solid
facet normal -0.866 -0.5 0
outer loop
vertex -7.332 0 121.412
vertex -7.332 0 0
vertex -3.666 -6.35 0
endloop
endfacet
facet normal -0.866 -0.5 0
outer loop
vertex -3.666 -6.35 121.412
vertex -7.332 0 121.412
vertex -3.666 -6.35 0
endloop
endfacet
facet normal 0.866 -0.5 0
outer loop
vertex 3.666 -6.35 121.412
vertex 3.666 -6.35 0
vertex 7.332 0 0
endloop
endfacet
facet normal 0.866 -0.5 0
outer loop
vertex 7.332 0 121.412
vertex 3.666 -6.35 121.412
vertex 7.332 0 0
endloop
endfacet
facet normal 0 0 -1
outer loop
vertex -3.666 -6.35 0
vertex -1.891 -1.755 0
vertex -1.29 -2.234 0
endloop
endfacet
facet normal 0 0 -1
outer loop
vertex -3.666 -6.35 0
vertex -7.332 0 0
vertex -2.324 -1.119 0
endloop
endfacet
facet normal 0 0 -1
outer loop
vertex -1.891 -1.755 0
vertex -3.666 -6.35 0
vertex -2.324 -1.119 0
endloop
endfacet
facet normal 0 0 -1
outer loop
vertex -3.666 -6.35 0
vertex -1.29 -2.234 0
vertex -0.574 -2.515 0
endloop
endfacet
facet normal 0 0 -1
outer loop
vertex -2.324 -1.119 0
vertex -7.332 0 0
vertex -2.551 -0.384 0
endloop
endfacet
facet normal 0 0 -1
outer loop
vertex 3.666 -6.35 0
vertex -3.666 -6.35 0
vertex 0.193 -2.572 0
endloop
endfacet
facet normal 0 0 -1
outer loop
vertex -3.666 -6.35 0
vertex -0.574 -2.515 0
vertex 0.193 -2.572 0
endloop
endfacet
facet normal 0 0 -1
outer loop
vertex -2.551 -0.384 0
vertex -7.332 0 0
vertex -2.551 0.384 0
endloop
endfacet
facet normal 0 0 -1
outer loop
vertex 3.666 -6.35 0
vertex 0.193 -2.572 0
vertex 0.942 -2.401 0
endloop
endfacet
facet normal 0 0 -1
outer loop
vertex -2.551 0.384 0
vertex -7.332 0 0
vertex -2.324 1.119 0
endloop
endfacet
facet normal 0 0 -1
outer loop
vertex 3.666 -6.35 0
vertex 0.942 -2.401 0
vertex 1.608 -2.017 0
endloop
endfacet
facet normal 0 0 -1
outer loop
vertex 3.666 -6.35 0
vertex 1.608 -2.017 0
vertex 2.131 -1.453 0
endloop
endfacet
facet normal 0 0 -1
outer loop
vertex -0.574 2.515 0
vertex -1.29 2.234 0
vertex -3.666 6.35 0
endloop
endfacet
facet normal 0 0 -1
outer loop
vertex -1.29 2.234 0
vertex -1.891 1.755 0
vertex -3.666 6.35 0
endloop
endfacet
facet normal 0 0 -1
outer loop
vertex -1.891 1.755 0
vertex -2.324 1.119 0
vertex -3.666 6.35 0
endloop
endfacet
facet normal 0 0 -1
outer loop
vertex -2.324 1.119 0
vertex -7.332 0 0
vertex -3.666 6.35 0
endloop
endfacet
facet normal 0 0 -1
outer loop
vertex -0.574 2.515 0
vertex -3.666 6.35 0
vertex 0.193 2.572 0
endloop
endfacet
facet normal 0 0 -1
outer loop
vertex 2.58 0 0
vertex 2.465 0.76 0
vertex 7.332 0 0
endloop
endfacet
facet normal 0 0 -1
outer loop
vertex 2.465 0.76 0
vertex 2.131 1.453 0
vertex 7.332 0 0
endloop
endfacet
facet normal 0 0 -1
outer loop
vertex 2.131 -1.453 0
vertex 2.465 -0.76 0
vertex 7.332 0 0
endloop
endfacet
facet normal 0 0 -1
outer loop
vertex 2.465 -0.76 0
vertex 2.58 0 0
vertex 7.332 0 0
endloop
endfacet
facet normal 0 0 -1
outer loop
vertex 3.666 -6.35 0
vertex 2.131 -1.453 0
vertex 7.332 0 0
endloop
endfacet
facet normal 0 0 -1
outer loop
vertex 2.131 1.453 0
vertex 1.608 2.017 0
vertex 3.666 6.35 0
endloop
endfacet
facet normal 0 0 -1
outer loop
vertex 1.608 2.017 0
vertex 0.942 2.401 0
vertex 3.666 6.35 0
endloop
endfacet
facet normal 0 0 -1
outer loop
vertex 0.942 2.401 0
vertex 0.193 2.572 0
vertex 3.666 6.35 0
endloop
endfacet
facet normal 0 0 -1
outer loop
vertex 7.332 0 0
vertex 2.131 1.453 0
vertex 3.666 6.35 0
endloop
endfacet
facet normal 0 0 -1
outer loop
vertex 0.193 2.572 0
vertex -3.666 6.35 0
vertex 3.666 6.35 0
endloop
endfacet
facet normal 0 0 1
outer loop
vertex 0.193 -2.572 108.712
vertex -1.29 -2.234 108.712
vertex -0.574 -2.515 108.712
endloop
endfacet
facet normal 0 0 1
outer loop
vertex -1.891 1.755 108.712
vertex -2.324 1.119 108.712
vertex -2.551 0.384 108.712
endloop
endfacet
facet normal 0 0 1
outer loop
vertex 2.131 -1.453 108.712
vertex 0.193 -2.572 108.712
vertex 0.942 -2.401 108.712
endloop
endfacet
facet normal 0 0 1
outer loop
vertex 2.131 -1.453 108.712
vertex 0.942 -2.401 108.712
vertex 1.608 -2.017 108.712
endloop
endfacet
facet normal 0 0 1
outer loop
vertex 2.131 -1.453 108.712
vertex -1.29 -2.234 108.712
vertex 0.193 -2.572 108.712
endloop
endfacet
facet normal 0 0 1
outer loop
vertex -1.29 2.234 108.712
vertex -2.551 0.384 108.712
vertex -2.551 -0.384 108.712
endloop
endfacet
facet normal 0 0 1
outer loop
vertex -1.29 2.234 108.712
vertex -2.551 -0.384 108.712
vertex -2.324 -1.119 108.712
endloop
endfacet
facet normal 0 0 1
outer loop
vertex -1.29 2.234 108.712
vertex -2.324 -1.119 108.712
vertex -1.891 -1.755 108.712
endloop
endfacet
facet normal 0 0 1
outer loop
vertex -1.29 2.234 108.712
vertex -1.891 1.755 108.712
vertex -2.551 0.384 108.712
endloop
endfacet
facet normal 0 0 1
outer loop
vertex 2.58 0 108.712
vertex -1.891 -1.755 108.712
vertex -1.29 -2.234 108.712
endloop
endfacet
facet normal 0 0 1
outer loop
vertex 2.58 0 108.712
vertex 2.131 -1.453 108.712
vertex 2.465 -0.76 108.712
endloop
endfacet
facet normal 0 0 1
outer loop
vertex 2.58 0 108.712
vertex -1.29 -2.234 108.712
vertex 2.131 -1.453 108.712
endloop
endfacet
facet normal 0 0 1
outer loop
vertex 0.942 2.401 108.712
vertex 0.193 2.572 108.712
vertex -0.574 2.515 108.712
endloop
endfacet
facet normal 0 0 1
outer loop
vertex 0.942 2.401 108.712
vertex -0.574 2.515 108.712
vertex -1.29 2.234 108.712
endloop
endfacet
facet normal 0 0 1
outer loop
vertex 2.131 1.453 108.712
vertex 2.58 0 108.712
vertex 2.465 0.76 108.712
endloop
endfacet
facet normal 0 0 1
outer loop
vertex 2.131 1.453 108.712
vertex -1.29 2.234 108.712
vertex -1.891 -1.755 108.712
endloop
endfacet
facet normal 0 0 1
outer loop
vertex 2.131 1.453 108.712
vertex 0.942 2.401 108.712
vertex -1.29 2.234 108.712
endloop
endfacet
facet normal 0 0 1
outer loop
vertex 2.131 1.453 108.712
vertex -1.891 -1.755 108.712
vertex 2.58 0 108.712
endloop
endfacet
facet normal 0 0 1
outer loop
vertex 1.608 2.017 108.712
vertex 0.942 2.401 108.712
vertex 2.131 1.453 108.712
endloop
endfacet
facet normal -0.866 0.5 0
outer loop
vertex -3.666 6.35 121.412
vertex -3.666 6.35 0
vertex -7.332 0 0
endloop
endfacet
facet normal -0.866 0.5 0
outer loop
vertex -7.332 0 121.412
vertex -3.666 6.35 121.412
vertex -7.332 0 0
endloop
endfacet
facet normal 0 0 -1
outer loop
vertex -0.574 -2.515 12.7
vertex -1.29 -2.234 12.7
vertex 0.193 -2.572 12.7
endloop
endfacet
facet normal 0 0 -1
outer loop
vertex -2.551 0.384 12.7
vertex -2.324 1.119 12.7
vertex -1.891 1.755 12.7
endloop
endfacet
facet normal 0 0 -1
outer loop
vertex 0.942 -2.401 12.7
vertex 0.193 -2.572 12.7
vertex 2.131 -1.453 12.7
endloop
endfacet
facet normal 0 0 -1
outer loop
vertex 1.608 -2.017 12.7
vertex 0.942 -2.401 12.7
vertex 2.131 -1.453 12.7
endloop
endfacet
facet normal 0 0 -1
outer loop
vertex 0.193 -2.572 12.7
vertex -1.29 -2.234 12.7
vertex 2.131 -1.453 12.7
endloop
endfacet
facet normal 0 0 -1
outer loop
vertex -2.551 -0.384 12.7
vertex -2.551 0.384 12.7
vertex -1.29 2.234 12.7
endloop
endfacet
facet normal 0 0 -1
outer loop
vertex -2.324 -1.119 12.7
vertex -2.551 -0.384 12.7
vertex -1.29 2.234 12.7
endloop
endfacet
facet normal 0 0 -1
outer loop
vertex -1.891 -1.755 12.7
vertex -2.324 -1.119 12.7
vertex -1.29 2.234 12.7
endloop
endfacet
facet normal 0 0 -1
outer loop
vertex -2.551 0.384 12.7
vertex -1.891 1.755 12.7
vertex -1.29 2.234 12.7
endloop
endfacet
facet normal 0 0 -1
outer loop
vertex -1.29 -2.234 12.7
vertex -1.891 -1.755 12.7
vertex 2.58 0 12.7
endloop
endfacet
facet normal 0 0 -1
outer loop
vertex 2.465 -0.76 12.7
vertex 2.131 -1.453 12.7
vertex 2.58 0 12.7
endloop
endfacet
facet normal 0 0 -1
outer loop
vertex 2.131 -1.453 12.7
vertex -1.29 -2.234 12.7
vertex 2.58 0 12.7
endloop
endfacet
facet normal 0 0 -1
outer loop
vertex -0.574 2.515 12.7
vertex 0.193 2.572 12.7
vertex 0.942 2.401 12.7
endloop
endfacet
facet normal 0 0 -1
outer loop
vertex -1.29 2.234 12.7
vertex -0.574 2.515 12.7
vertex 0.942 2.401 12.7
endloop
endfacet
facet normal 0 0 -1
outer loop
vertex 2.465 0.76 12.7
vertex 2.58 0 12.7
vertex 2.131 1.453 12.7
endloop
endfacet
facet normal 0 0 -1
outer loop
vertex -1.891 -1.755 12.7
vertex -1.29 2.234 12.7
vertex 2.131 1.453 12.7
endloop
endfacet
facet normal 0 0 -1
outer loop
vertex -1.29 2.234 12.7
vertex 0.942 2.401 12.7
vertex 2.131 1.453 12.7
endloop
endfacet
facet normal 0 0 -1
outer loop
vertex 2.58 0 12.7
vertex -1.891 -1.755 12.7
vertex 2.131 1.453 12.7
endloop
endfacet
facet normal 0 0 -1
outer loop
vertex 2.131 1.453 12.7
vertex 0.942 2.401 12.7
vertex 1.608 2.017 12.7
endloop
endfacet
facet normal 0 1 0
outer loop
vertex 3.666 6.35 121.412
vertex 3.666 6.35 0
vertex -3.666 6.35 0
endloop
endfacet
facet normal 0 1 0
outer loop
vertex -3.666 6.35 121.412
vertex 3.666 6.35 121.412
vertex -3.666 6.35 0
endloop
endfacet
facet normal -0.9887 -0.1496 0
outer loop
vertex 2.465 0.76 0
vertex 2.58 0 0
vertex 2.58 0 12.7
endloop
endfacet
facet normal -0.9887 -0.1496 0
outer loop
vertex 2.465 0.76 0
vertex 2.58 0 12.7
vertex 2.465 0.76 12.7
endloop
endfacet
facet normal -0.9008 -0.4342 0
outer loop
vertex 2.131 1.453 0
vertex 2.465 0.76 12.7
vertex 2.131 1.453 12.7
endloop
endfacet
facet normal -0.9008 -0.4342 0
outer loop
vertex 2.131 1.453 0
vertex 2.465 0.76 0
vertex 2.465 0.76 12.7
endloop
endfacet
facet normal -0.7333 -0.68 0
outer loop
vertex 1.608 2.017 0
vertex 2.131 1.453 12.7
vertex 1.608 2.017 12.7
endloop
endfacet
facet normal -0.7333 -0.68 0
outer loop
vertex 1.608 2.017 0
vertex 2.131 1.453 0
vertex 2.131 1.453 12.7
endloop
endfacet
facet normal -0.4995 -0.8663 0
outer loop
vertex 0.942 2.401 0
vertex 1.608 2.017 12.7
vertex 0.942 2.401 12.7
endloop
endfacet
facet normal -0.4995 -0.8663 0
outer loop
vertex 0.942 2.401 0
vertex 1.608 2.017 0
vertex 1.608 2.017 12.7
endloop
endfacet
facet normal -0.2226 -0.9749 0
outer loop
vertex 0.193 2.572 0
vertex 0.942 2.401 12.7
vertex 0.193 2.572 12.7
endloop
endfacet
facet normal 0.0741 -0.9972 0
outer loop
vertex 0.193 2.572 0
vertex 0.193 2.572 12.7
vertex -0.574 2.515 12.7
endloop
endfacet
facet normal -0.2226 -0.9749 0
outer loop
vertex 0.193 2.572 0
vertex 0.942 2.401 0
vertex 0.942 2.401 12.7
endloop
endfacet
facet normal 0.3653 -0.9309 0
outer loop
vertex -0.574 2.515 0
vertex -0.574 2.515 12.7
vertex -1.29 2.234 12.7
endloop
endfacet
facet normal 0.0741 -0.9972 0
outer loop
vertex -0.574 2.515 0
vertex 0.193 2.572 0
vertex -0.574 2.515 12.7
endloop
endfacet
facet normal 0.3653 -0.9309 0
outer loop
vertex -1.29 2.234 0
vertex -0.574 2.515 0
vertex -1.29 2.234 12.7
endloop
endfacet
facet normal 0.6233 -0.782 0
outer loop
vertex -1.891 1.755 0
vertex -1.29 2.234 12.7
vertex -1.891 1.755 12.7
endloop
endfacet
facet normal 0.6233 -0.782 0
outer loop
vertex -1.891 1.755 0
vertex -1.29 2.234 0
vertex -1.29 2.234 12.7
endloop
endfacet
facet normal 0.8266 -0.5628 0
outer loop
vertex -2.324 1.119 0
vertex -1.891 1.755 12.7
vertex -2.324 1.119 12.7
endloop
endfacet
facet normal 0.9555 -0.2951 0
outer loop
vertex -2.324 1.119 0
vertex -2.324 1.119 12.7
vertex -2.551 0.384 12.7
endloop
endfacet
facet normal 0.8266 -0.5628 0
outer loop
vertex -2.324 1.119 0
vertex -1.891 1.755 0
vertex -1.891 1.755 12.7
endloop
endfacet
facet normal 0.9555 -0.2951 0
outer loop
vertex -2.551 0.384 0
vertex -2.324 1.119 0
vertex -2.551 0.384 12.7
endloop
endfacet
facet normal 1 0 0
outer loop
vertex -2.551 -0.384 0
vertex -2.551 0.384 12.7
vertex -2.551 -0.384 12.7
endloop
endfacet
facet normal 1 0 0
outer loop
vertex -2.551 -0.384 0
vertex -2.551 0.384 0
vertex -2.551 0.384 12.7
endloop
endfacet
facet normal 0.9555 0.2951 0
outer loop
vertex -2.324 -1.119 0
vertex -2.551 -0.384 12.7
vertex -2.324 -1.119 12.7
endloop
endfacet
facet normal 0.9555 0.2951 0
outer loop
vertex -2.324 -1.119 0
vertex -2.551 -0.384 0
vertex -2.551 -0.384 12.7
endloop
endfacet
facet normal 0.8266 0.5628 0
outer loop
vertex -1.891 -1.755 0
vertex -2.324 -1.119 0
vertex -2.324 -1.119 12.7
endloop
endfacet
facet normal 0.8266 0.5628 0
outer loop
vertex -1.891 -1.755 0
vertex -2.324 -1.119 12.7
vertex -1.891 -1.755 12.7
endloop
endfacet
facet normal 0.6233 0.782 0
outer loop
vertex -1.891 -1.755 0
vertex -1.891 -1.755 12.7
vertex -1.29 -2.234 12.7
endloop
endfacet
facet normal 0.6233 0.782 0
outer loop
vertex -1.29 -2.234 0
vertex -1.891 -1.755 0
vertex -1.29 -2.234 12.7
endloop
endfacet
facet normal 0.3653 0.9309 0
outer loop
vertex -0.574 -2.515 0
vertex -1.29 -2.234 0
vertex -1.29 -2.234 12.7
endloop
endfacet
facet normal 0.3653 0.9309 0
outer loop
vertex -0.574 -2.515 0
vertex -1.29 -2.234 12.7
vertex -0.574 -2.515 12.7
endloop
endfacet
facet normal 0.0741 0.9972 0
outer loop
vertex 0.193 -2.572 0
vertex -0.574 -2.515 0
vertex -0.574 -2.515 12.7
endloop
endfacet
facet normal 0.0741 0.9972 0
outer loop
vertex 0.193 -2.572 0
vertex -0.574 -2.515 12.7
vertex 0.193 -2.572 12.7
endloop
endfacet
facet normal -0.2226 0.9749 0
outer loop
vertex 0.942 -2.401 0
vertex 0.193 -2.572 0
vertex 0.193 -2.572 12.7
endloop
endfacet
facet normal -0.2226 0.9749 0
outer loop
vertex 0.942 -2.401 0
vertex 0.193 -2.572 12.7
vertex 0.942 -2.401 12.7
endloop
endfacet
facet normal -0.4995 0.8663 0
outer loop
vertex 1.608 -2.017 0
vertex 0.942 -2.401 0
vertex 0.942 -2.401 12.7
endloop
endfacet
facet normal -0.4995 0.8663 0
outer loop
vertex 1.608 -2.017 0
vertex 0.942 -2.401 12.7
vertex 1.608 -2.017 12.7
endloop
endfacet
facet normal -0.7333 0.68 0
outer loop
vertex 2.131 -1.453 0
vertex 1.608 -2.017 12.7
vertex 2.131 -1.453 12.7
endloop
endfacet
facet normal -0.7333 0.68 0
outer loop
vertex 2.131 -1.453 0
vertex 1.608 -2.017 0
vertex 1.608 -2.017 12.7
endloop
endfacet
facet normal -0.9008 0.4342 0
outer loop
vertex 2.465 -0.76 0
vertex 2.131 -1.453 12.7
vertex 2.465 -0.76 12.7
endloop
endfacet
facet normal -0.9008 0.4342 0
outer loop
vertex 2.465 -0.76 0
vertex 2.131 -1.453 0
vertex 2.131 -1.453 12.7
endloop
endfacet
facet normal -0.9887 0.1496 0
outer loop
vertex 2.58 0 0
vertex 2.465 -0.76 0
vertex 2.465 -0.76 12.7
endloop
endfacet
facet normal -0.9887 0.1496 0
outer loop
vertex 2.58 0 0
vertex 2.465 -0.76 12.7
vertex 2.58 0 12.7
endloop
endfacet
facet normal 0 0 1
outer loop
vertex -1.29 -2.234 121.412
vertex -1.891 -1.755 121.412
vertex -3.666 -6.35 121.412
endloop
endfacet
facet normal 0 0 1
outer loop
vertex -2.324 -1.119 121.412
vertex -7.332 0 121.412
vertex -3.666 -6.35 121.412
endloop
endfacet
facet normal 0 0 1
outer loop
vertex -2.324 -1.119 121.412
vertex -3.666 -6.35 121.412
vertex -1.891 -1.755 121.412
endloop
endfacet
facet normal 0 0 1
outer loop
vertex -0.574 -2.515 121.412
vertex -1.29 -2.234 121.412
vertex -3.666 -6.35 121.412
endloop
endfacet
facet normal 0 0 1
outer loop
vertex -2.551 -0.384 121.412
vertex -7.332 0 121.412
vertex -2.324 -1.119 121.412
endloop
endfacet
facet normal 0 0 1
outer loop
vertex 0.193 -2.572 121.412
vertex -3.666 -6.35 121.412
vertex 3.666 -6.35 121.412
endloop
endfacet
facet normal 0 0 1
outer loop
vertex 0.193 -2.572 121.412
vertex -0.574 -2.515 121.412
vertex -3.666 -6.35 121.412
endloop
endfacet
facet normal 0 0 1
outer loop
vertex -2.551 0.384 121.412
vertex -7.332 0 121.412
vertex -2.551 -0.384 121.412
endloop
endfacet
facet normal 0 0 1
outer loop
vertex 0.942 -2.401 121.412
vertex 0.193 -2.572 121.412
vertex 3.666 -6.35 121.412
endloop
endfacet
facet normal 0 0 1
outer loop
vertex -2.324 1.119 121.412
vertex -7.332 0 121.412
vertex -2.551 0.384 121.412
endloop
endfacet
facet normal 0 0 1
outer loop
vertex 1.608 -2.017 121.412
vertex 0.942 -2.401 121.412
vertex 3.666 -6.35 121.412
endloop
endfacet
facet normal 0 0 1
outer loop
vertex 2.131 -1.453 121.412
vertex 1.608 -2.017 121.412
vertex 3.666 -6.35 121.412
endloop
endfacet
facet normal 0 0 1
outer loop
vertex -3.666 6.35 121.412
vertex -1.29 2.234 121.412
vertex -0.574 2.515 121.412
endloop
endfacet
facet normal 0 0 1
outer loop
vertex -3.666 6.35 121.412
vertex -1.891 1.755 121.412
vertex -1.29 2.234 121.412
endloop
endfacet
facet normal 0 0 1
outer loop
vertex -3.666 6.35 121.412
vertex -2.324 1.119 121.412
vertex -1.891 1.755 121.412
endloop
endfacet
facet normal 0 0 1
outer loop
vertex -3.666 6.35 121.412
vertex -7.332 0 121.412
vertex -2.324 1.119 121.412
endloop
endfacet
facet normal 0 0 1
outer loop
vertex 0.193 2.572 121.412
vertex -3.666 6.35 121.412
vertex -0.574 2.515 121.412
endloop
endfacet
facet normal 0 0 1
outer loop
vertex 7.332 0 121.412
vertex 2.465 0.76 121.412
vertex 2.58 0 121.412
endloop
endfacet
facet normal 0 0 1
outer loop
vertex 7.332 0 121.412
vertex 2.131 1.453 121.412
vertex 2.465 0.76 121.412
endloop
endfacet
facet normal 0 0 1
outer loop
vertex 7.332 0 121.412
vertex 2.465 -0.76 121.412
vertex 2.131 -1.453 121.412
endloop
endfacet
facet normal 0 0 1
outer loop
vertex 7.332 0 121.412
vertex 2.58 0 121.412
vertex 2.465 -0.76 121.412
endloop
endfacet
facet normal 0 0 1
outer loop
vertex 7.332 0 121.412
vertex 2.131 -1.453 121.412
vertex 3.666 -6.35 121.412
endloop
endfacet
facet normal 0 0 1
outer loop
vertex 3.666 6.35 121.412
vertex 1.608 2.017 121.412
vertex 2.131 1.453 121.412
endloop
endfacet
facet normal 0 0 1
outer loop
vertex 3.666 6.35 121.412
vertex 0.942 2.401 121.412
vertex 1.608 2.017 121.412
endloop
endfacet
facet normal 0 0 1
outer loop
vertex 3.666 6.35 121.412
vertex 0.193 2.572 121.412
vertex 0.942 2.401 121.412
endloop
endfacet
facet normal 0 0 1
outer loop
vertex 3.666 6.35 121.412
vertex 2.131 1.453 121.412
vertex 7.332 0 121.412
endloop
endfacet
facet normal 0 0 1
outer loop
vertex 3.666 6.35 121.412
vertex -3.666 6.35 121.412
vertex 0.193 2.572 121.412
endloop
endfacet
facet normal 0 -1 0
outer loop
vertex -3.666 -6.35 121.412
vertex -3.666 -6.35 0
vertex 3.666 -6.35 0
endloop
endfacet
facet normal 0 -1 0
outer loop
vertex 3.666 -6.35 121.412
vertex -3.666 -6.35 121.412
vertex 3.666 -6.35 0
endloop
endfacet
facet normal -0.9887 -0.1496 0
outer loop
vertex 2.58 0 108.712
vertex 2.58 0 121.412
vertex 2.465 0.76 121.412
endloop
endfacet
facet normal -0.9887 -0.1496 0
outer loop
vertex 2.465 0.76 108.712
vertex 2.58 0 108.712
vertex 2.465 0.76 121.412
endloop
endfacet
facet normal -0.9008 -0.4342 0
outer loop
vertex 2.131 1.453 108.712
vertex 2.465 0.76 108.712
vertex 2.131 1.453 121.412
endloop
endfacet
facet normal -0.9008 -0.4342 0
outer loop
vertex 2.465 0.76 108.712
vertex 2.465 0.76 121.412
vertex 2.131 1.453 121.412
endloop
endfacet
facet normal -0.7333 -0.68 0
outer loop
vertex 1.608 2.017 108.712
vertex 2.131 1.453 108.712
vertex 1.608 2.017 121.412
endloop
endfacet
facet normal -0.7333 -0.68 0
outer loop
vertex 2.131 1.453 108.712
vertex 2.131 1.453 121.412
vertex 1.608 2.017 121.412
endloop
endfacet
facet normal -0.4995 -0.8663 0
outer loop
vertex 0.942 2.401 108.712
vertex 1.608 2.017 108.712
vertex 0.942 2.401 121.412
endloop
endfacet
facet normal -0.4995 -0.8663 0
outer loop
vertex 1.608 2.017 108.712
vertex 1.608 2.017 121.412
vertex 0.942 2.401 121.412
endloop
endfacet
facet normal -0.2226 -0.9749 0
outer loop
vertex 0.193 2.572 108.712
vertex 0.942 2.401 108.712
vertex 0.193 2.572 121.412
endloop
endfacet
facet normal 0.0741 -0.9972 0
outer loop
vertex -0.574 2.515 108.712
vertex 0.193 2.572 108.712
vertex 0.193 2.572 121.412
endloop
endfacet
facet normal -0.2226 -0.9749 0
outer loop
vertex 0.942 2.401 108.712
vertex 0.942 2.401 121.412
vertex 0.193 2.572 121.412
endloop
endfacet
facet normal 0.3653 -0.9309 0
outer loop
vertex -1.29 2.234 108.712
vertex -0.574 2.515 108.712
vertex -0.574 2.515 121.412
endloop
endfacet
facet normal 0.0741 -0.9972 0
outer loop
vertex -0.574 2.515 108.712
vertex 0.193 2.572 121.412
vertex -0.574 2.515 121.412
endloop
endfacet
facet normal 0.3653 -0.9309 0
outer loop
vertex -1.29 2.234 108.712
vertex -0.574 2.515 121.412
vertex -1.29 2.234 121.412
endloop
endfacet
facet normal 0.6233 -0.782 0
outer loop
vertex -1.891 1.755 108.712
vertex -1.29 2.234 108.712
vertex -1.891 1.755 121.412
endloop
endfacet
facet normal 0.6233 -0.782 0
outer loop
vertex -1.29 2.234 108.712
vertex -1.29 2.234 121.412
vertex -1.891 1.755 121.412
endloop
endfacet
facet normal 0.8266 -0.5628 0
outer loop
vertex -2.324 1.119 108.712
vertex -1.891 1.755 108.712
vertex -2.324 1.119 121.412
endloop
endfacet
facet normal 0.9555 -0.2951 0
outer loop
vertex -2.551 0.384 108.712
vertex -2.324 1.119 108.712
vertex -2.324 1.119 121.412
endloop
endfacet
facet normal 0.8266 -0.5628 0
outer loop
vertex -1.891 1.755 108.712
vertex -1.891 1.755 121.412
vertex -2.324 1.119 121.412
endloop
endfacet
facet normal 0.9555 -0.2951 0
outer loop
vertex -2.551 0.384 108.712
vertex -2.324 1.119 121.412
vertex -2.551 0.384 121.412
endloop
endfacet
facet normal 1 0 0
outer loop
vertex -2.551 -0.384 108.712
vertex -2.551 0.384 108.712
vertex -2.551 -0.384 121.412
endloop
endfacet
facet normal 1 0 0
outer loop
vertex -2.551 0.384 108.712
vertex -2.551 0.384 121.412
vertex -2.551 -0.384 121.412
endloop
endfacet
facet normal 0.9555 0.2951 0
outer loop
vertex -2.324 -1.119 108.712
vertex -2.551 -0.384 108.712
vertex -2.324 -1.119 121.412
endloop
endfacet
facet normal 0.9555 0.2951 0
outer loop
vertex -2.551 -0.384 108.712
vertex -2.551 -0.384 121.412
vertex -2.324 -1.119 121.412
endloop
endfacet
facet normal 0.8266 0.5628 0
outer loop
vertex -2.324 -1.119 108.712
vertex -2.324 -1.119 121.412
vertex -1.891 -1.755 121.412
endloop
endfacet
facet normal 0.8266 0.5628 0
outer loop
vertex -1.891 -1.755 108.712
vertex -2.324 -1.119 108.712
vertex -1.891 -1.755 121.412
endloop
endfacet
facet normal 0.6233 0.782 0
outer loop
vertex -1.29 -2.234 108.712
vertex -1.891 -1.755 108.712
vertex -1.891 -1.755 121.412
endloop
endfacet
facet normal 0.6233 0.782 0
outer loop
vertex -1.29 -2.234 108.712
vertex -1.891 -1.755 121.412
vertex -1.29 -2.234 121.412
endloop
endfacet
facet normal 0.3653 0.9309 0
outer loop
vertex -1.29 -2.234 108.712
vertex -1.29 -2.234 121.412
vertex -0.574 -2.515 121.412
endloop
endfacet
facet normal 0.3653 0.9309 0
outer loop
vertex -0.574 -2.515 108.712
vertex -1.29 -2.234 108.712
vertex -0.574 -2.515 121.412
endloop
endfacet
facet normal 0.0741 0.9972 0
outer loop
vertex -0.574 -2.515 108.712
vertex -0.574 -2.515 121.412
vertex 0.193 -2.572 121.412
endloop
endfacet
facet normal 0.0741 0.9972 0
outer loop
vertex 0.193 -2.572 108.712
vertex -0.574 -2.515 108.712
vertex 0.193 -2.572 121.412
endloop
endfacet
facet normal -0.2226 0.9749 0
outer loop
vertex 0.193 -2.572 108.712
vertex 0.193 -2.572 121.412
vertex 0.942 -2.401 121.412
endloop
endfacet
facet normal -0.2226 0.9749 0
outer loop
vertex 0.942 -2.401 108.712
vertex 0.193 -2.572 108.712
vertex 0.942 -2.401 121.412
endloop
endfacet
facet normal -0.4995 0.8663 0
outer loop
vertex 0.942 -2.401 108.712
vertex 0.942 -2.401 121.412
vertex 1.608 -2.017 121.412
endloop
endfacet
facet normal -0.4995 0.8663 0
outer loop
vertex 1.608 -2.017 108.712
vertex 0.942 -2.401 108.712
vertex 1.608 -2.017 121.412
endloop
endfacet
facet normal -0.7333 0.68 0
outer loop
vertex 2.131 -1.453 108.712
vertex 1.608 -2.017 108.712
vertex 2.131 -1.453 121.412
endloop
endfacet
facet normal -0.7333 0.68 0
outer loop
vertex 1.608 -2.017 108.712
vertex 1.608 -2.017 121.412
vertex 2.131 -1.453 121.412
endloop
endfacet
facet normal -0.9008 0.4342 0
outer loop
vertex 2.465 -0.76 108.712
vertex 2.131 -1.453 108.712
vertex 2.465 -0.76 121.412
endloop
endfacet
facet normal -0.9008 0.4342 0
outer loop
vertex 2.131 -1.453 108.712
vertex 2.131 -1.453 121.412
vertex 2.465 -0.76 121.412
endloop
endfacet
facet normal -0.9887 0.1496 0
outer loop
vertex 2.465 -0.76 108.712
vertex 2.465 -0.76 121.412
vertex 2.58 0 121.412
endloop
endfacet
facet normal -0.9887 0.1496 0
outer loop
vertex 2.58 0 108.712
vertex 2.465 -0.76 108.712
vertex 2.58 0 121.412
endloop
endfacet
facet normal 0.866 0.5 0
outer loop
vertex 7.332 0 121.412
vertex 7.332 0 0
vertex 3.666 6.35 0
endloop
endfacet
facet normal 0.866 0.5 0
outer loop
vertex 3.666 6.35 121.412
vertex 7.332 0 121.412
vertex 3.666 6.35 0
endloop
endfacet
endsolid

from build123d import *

# Parameters (mm, degrees)
BOSS_EXTRUDE1_DEPTH = 121.412
SKETCH2_R           = 2.5796875
CUT_EXTRUDE1_DEPTH  = 12.7


with BuildPart() as part:
    # Sketch1 → Boss-Extrude1 (new body)
    with BuildSketch(Plane.XY):
        Polygon((7.332348419, 0), (3.666174209, 6.35), (-3.666174209, 6.35), (-7.332348419, 0), (-3.666174209, -6.35), (3.666174209, -6.35), align=None)
    extrude(amount=BOSS_EXTRUDE1_DEPTH)

    # Sketch2 → Cut-Extrude1 (cut)
    with BuildSketch(Plane.XY.offset(121.412)):
        Circle(SKETCH2_R)
    cut_extrude1 = extrude(amount=-CUT_EXTRUDE1_DEPTH, mode=Mode.SUBTRACT)

    # Mirror1: Cut-Extrude1 across plane
    add(cut_extrude1.mirror(Plane.XY.offset(60.706)), mode=Mode.SUBTRACT)


solid = part.part
